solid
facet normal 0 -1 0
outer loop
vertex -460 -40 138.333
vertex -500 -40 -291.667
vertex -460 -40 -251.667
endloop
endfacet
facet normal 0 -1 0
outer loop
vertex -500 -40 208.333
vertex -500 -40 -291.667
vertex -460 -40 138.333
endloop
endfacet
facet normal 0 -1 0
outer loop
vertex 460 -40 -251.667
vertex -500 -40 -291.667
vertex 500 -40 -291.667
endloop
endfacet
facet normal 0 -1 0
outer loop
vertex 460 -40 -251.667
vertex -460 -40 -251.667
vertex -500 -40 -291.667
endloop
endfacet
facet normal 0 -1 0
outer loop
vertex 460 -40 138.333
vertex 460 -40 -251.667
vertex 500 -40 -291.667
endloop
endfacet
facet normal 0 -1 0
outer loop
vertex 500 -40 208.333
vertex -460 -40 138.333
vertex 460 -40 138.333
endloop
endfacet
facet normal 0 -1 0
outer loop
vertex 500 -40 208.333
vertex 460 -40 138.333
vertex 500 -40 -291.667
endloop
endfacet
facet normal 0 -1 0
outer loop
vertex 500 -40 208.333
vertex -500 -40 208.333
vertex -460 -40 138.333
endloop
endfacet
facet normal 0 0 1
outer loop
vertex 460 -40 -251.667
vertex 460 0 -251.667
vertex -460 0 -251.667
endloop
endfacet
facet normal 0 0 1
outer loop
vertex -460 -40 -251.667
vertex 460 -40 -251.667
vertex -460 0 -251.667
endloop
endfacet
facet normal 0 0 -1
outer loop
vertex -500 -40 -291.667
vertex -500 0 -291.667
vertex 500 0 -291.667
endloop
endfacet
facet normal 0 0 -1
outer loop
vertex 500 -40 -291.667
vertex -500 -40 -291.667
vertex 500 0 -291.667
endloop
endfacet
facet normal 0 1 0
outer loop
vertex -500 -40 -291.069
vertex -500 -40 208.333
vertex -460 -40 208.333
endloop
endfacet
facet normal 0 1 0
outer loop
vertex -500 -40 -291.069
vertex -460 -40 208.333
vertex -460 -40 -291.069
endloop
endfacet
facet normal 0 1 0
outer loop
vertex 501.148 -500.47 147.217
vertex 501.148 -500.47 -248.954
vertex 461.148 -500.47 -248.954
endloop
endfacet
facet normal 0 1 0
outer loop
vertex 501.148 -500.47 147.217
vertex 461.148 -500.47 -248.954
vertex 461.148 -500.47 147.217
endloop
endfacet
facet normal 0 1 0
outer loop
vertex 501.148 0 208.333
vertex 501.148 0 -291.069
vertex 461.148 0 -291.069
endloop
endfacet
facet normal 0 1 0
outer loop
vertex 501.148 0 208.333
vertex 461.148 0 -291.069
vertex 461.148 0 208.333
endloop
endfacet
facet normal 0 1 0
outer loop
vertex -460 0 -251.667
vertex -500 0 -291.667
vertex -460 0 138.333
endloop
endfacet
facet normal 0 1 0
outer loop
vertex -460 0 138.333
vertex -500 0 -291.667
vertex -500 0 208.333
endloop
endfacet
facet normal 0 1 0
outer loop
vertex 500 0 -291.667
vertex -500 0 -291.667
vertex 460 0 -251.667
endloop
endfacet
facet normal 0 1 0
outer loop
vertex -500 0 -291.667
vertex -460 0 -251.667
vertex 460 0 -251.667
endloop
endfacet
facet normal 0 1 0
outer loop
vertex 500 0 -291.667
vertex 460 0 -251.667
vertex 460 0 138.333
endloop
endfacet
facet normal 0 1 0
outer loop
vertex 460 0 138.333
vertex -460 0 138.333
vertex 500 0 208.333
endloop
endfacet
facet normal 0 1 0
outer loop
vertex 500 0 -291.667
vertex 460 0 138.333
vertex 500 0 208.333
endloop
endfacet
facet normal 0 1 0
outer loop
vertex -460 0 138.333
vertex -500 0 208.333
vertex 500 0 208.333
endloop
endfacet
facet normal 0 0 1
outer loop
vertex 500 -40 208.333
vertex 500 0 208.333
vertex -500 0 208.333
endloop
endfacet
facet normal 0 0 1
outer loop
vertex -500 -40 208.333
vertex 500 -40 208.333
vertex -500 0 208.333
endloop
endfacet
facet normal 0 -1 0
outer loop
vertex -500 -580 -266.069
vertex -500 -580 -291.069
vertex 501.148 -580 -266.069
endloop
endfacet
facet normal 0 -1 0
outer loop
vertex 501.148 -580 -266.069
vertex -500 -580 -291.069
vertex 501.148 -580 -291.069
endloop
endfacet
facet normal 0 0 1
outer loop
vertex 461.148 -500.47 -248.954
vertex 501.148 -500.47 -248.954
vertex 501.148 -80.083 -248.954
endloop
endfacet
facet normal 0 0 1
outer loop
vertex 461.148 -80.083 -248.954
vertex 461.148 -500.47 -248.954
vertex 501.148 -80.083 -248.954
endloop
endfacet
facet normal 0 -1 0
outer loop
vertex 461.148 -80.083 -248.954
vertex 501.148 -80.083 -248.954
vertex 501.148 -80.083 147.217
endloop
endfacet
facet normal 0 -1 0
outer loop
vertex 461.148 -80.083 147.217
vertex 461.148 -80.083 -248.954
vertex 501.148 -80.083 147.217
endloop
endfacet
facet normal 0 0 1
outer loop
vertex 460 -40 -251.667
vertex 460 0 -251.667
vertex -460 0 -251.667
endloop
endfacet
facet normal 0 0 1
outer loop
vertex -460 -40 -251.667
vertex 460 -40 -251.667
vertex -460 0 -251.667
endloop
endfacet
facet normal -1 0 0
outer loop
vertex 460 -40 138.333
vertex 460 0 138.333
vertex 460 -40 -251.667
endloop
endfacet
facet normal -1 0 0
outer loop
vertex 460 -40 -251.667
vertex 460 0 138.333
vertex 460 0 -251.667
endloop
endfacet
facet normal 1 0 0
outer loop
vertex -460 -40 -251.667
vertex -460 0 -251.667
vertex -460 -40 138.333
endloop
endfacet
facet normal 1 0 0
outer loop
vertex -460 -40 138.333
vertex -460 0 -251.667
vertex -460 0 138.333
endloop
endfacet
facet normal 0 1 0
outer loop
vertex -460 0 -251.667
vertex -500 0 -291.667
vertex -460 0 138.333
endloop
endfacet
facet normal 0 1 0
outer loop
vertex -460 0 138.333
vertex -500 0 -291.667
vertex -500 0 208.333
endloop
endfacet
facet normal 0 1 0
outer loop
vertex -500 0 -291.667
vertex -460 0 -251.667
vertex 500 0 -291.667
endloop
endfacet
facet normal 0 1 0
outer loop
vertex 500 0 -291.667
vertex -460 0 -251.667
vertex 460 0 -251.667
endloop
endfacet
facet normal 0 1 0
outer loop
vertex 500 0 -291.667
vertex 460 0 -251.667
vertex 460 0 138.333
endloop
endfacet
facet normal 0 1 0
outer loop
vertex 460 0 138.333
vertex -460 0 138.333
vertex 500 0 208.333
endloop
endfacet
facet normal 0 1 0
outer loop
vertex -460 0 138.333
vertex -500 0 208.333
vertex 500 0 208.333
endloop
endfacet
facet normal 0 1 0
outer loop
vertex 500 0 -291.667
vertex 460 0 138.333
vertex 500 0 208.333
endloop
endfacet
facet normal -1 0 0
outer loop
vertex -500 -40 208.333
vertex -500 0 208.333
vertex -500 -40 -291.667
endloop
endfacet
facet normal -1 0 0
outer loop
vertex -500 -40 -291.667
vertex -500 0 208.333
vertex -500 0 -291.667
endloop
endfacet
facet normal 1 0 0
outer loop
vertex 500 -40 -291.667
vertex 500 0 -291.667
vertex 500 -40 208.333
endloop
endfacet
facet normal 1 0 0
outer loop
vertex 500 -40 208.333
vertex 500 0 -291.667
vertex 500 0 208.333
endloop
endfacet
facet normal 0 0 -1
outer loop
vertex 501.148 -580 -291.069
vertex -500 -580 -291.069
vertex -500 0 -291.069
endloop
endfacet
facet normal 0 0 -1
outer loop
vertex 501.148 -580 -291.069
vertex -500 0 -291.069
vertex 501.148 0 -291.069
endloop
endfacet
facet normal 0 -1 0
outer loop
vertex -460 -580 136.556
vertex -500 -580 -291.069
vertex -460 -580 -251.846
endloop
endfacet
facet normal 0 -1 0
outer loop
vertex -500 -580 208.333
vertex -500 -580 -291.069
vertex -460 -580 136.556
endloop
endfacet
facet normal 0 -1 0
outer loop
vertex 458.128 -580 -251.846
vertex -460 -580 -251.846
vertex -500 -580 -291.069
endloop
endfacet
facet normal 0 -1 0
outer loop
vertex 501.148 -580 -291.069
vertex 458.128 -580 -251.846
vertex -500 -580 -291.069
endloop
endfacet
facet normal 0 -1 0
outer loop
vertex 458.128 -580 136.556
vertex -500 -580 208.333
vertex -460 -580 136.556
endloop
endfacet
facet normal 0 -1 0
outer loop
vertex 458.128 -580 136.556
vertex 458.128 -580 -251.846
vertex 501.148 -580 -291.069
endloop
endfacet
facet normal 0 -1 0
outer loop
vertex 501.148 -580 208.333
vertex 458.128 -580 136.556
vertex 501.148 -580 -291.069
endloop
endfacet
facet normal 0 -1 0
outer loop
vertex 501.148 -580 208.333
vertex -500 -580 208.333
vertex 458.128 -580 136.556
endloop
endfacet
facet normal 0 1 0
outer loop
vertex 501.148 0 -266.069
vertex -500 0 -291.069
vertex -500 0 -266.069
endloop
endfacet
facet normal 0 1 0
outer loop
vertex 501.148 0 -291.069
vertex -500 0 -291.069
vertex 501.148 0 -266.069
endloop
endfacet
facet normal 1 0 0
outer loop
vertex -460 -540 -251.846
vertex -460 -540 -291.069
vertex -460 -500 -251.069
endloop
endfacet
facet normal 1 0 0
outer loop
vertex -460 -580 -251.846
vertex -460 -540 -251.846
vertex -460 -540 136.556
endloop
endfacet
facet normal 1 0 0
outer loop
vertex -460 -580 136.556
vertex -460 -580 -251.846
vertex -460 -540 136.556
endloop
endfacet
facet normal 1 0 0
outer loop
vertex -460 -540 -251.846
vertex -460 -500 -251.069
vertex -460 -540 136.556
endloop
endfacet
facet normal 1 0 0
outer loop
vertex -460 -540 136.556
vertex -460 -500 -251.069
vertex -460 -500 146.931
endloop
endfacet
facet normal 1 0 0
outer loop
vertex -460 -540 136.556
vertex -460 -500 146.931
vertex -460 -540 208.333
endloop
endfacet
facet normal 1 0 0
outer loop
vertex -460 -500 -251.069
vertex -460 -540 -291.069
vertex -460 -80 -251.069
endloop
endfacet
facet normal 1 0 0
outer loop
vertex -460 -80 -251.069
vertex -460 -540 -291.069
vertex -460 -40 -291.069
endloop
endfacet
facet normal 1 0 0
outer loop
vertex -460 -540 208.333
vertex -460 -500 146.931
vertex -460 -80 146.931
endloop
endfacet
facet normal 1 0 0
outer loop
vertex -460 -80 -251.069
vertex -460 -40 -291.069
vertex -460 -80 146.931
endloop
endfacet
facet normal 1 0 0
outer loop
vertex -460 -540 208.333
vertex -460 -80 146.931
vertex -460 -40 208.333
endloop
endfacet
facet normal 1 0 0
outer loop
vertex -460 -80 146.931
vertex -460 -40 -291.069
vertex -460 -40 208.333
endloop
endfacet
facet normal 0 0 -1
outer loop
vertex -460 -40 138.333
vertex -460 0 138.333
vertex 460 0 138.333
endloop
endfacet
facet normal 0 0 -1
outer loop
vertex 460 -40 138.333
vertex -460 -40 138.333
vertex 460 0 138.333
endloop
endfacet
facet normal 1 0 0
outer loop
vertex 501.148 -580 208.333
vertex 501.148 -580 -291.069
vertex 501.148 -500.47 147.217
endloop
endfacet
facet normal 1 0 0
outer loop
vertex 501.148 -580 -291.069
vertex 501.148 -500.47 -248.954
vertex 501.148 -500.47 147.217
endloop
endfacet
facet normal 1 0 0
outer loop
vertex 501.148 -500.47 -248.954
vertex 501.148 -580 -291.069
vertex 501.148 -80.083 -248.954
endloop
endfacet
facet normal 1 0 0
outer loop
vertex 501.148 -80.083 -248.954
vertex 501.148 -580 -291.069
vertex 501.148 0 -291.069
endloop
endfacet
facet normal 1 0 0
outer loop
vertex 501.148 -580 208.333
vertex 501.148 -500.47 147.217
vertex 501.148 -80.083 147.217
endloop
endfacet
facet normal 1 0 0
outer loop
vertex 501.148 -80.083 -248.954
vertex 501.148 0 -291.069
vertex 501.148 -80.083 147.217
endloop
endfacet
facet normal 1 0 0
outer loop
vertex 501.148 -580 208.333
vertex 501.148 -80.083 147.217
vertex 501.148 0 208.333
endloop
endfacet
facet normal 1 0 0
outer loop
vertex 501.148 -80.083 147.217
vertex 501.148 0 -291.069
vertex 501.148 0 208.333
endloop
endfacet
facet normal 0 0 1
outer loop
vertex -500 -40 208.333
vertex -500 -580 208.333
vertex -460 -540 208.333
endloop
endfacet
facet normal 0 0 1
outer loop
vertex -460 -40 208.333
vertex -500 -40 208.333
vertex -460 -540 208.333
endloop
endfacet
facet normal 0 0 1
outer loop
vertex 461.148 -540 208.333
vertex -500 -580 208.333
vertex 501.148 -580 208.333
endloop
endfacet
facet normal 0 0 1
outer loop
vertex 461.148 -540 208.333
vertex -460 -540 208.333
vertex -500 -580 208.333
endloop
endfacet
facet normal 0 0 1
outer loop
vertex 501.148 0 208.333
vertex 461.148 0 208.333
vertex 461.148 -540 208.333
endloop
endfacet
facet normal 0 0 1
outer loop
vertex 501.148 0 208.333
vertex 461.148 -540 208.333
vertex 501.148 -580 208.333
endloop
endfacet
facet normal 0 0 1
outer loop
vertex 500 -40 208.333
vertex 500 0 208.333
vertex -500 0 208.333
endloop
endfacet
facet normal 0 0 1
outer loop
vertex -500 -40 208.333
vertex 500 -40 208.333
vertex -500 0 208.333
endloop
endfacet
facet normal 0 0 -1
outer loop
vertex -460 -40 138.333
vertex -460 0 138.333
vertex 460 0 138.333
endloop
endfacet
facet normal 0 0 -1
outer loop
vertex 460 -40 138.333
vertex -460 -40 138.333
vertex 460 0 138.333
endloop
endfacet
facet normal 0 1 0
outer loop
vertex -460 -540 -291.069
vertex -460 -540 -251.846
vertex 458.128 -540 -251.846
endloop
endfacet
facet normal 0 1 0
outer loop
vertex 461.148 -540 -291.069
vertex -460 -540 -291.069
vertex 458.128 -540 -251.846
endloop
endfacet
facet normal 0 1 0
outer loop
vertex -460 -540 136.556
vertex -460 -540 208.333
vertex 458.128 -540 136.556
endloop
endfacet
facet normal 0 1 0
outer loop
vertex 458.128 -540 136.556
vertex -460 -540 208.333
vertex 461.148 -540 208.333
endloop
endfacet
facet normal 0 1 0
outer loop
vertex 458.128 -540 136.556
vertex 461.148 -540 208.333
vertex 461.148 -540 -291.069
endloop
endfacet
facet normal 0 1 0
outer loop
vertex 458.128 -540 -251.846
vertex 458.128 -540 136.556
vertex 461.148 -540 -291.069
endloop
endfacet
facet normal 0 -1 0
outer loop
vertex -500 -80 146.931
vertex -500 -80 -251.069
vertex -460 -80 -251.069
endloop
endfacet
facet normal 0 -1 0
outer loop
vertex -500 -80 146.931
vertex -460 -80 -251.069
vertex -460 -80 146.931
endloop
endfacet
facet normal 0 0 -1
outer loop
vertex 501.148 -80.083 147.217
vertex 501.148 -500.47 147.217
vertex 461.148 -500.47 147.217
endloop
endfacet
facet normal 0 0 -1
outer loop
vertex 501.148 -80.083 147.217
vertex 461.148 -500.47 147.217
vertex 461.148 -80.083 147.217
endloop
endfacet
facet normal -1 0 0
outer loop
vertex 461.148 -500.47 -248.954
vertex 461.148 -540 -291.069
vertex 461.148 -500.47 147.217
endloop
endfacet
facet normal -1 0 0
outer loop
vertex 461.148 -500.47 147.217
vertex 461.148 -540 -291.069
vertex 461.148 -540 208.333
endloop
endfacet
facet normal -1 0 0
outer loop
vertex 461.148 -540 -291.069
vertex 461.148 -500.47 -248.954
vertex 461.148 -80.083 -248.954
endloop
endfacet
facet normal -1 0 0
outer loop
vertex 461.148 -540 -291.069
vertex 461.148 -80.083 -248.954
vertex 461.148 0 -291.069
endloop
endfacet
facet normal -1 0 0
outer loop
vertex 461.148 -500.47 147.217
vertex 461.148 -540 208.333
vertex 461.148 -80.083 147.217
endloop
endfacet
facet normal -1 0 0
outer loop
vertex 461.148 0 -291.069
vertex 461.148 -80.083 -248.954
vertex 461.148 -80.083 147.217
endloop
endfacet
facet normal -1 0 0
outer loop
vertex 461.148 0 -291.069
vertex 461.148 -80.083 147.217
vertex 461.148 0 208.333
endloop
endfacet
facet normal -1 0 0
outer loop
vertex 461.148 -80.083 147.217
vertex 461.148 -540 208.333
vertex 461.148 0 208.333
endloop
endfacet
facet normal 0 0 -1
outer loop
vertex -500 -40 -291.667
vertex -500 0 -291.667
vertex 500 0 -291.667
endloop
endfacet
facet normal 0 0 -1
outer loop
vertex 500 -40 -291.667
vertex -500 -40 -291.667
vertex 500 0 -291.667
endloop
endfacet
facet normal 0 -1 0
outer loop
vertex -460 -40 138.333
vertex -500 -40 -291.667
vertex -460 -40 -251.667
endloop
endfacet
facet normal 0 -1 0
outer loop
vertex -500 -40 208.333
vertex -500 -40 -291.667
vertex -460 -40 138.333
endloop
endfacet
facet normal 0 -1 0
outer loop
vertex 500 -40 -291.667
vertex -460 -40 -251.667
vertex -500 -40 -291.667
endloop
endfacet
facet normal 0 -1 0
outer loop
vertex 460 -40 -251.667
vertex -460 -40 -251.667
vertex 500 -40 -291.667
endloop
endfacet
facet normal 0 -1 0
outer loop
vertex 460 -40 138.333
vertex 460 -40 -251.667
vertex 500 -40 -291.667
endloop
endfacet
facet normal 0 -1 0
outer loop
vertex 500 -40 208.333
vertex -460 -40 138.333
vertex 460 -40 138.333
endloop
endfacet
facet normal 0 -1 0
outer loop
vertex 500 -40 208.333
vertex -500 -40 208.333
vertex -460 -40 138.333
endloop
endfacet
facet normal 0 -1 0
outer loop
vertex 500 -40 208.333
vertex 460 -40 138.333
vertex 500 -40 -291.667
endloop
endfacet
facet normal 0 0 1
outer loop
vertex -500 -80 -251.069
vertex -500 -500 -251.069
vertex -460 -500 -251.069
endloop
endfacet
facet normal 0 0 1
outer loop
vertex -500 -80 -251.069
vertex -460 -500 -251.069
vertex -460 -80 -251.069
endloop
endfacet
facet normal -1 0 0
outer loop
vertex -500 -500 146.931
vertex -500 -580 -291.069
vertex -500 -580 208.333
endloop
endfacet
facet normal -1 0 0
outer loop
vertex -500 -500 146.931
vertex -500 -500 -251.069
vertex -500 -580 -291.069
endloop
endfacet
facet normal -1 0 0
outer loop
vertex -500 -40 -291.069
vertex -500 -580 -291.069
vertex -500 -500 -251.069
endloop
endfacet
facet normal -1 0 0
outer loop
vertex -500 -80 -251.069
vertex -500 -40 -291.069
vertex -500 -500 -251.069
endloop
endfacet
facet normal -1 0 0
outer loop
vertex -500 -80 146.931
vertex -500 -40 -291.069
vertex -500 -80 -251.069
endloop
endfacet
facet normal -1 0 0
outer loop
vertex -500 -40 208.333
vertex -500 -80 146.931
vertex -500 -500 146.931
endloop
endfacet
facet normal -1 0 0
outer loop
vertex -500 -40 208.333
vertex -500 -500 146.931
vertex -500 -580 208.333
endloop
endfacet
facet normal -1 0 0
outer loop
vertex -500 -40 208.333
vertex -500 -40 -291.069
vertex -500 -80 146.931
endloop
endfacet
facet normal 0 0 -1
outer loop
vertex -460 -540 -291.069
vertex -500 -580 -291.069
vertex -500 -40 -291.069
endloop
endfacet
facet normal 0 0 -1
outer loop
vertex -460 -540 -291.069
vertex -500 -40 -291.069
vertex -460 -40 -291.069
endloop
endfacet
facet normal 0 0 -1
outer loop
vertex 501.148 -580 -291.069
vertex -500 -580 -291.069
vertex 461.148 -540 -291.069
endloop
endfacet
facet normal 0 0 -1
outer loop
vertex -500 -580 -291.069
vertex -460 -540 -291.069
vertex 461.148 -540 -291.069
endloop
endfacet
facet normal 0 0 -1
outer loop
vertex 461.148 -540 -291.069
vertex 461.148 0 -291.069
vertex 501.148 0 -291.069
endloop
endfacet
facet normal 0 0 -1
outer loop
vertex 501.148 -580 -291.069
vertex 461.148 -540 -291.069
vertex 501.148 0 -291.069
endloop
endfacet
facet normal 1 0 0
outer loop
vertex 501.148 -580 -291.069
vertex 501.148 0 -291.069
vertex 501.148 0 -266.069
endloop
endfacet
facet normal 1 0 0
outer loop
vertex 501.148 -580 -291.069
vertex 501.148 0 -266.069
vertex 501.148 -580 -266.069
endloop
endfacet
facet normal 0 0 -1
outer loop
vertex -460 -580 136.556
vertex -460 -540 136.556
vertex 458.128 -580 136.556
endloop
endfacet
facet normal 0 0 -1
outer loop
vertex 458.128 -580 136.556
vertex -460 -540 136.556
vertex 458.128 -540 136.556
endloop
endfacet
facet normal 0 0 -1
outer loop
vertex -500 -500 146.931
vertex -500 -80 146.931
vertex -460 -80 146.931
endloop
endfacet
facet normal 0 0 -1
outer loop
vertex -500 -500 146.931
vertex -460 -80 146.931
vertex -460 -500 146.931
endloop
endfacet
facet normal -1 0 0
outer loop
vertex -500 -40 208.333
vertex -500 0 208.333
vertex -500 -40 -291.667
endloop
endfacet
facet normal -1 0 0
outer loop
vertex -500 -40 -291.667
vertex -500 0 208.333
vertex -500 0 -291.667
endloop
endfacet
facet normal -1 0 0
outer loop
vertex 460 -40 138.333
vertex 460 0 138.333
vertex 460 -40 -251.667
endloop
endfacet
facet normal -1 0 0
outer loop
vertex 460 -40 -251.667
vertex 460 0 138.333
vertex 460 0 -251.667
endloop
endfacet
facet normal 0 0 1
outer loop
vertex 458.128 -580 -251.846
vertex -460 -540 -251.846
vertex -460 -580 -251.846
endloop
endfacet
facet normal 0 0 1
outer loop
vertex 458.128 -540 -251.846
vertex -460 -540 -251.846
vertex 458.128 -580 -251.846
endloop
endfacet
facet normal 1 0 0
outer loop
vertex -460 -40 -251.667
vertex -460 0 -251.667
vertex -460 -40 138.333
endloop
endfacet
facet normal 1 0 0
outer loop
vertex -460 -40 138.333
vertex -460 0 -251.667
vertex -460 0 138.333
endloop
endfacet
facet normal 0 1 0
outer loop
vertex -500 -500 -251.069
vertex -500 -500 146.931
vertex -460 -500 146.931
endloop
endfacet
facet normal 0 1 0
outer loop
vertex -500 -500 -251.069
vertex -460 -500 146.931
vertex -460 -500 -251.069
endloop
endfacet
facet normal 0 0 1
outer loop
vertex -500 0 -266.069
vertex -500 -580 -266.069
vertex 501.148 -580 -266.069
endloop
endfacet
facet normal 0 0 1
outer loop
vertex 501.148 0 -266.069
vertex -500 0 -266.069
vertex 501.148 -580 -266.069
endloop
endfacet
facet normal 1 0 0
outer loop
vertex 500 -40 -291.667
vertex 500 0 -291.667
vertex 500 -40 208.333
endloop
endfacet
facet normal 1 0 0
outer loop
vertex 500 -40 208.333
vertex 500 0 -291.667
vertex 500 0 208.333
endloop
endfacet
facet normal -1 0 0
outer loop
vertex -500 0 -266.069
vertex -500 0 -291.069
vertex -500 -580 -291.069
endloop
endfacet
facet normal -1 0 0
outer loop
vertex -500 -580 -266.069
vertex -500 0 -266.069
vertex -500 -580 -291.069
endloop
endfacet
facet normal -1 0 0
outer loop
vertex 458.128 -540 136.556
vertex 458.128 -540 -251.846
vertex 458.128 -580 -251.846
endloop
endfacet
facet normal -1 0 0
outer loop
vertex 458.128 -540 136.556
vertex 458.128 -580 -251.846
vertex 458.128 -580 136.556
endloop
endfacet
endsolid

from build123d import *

# Parameters (mm, degrees)
F1_DEPTH  = 40
F2_DEPTH  = 40
F4_DEPTH  = 40
F5_W      = 1001.1475086212
F5_H      = 499.4027398658
F5_W_2    = 918.1282734871
F5_H_2    = 388.4018957615
F6_DEPTH  = 40
F7_W      = 580
F7_H      = 499.4027398658
F7_W_2    = 420.3874319792
F7_H_2    = 396.1715698242
F8_DEPTH  = 40
F9_W      = 1001.1475086212
F9_H      = 580
F10_DEPTH = 25


# Not quite as in the source:
# - a feature names something its author has since deleted; it is built from what else it names


with BuildPart() as f1:
    # F0 (on Front) → F1 (new body)
    with BuildSketch(Plane.XZ):
        Polygon((-500, 208.3333301377), (-500, 138.3333301377), (-460, 138.3333301377), (460, 138.3333301377), (500, 138.3333301377), (500, 208.3333301377), align=None)
        Polygon((-500, 138.3333301377), (-500, -291.6666698623), (500, -291.6666698623), (500, 138.3333301377), (460, 138.3333301377), (460, -251.6666698623), (-460, -251.6666698623), (-460, 138.3333301377), align=None)
    extrude(amount=F1_DEPTH)


with BuildPart() as f2:
    # F0 (on Front) → F2 (new body)
    with BuildSketch(Plane.XZ):
        Polygon((-500, 138.3333301377), (-500, -291.6666698623), (500, -291.6666698623), (500, 138.3333301377), (460, 138.3333301377), (460, -251.6666698623), (-460, -251.6666698623), (-460, 138.3333301377), align=None)
        Polygon((-500, 208.3333301377), (-500, 138.3333301377), (-460, 138.3333301377), (460, 138.3333301377), (500, 138.3333301377), (500, 208.3333301377), align=None)
    extrude(amount=F2_DEPTH)


with BuildPart() as f4:
    # F3 (on face) → F4 (new body)
    with BuildSketch(Plane(origin=(-500, 0, 0), x_dir=(0, -1, 0), z_dir=(-1, 0, 0))):
        Polygon((40, 208.3333301377), (40, 146.9305902719), (80, 146.9305902719), (500, 146.9305902719), (540, 146.9305902719), (540, 208.3333301377), align=None)
        Polygon((80, 146.9305902719), (40, 146.9305902719), (40, -291.0694097281), (540, -291.0694097281), (540, 146.9305902719), (500, 146.9305902719), (500, -251.0694097281), (80, -251.0694097281), align=None)
    extrude(amount=-F4_DEPTH)

    # F5 (on face) → F6 (join)
    with BuildSketch(Plane.XZ.offset(540)):
        with Locations((0.5737543106, -41.3680397952)):
            Rectangle(F5_W, F5_H)
        with Locations((-0.9358632565, -57.6452165842)):
            Rectangle(F5_W_2, F5_H_2, mode=Mode.SUBTRACT)
    extrude(amount=F6_DEPTH)

    # F7 (on face) → F8 (join)
    with BuildSketch(Plane.YZ.offset(501.1475086212)):
        with Locations((-290, -41.3680397952)):
            Rectangle(F7_W, F7_H)
        with Locations((-290.2767434716, -50.868704915)):
            Rectangle(F7_W_2, F7_H_2, mode=Mode.SUBTRACT)
    extrude(amount=-F8_DEPTH)


with BuildPart() as f10:
    # F9 (on face) → F10 (new body)
    with BuildSketch(Plane(origin=(0, 0, -291.0694097281), x_dir=(1, 0, 0), z_dir=(0, 0, -1))):
        with Locations((0.5737543106, 290)):
            Rectangle(F9_W, F9_H)
    extrude(amount=-F10_DEPTH)


solid = Compound([f1.part, f2.part, f4.part, f10.part])
